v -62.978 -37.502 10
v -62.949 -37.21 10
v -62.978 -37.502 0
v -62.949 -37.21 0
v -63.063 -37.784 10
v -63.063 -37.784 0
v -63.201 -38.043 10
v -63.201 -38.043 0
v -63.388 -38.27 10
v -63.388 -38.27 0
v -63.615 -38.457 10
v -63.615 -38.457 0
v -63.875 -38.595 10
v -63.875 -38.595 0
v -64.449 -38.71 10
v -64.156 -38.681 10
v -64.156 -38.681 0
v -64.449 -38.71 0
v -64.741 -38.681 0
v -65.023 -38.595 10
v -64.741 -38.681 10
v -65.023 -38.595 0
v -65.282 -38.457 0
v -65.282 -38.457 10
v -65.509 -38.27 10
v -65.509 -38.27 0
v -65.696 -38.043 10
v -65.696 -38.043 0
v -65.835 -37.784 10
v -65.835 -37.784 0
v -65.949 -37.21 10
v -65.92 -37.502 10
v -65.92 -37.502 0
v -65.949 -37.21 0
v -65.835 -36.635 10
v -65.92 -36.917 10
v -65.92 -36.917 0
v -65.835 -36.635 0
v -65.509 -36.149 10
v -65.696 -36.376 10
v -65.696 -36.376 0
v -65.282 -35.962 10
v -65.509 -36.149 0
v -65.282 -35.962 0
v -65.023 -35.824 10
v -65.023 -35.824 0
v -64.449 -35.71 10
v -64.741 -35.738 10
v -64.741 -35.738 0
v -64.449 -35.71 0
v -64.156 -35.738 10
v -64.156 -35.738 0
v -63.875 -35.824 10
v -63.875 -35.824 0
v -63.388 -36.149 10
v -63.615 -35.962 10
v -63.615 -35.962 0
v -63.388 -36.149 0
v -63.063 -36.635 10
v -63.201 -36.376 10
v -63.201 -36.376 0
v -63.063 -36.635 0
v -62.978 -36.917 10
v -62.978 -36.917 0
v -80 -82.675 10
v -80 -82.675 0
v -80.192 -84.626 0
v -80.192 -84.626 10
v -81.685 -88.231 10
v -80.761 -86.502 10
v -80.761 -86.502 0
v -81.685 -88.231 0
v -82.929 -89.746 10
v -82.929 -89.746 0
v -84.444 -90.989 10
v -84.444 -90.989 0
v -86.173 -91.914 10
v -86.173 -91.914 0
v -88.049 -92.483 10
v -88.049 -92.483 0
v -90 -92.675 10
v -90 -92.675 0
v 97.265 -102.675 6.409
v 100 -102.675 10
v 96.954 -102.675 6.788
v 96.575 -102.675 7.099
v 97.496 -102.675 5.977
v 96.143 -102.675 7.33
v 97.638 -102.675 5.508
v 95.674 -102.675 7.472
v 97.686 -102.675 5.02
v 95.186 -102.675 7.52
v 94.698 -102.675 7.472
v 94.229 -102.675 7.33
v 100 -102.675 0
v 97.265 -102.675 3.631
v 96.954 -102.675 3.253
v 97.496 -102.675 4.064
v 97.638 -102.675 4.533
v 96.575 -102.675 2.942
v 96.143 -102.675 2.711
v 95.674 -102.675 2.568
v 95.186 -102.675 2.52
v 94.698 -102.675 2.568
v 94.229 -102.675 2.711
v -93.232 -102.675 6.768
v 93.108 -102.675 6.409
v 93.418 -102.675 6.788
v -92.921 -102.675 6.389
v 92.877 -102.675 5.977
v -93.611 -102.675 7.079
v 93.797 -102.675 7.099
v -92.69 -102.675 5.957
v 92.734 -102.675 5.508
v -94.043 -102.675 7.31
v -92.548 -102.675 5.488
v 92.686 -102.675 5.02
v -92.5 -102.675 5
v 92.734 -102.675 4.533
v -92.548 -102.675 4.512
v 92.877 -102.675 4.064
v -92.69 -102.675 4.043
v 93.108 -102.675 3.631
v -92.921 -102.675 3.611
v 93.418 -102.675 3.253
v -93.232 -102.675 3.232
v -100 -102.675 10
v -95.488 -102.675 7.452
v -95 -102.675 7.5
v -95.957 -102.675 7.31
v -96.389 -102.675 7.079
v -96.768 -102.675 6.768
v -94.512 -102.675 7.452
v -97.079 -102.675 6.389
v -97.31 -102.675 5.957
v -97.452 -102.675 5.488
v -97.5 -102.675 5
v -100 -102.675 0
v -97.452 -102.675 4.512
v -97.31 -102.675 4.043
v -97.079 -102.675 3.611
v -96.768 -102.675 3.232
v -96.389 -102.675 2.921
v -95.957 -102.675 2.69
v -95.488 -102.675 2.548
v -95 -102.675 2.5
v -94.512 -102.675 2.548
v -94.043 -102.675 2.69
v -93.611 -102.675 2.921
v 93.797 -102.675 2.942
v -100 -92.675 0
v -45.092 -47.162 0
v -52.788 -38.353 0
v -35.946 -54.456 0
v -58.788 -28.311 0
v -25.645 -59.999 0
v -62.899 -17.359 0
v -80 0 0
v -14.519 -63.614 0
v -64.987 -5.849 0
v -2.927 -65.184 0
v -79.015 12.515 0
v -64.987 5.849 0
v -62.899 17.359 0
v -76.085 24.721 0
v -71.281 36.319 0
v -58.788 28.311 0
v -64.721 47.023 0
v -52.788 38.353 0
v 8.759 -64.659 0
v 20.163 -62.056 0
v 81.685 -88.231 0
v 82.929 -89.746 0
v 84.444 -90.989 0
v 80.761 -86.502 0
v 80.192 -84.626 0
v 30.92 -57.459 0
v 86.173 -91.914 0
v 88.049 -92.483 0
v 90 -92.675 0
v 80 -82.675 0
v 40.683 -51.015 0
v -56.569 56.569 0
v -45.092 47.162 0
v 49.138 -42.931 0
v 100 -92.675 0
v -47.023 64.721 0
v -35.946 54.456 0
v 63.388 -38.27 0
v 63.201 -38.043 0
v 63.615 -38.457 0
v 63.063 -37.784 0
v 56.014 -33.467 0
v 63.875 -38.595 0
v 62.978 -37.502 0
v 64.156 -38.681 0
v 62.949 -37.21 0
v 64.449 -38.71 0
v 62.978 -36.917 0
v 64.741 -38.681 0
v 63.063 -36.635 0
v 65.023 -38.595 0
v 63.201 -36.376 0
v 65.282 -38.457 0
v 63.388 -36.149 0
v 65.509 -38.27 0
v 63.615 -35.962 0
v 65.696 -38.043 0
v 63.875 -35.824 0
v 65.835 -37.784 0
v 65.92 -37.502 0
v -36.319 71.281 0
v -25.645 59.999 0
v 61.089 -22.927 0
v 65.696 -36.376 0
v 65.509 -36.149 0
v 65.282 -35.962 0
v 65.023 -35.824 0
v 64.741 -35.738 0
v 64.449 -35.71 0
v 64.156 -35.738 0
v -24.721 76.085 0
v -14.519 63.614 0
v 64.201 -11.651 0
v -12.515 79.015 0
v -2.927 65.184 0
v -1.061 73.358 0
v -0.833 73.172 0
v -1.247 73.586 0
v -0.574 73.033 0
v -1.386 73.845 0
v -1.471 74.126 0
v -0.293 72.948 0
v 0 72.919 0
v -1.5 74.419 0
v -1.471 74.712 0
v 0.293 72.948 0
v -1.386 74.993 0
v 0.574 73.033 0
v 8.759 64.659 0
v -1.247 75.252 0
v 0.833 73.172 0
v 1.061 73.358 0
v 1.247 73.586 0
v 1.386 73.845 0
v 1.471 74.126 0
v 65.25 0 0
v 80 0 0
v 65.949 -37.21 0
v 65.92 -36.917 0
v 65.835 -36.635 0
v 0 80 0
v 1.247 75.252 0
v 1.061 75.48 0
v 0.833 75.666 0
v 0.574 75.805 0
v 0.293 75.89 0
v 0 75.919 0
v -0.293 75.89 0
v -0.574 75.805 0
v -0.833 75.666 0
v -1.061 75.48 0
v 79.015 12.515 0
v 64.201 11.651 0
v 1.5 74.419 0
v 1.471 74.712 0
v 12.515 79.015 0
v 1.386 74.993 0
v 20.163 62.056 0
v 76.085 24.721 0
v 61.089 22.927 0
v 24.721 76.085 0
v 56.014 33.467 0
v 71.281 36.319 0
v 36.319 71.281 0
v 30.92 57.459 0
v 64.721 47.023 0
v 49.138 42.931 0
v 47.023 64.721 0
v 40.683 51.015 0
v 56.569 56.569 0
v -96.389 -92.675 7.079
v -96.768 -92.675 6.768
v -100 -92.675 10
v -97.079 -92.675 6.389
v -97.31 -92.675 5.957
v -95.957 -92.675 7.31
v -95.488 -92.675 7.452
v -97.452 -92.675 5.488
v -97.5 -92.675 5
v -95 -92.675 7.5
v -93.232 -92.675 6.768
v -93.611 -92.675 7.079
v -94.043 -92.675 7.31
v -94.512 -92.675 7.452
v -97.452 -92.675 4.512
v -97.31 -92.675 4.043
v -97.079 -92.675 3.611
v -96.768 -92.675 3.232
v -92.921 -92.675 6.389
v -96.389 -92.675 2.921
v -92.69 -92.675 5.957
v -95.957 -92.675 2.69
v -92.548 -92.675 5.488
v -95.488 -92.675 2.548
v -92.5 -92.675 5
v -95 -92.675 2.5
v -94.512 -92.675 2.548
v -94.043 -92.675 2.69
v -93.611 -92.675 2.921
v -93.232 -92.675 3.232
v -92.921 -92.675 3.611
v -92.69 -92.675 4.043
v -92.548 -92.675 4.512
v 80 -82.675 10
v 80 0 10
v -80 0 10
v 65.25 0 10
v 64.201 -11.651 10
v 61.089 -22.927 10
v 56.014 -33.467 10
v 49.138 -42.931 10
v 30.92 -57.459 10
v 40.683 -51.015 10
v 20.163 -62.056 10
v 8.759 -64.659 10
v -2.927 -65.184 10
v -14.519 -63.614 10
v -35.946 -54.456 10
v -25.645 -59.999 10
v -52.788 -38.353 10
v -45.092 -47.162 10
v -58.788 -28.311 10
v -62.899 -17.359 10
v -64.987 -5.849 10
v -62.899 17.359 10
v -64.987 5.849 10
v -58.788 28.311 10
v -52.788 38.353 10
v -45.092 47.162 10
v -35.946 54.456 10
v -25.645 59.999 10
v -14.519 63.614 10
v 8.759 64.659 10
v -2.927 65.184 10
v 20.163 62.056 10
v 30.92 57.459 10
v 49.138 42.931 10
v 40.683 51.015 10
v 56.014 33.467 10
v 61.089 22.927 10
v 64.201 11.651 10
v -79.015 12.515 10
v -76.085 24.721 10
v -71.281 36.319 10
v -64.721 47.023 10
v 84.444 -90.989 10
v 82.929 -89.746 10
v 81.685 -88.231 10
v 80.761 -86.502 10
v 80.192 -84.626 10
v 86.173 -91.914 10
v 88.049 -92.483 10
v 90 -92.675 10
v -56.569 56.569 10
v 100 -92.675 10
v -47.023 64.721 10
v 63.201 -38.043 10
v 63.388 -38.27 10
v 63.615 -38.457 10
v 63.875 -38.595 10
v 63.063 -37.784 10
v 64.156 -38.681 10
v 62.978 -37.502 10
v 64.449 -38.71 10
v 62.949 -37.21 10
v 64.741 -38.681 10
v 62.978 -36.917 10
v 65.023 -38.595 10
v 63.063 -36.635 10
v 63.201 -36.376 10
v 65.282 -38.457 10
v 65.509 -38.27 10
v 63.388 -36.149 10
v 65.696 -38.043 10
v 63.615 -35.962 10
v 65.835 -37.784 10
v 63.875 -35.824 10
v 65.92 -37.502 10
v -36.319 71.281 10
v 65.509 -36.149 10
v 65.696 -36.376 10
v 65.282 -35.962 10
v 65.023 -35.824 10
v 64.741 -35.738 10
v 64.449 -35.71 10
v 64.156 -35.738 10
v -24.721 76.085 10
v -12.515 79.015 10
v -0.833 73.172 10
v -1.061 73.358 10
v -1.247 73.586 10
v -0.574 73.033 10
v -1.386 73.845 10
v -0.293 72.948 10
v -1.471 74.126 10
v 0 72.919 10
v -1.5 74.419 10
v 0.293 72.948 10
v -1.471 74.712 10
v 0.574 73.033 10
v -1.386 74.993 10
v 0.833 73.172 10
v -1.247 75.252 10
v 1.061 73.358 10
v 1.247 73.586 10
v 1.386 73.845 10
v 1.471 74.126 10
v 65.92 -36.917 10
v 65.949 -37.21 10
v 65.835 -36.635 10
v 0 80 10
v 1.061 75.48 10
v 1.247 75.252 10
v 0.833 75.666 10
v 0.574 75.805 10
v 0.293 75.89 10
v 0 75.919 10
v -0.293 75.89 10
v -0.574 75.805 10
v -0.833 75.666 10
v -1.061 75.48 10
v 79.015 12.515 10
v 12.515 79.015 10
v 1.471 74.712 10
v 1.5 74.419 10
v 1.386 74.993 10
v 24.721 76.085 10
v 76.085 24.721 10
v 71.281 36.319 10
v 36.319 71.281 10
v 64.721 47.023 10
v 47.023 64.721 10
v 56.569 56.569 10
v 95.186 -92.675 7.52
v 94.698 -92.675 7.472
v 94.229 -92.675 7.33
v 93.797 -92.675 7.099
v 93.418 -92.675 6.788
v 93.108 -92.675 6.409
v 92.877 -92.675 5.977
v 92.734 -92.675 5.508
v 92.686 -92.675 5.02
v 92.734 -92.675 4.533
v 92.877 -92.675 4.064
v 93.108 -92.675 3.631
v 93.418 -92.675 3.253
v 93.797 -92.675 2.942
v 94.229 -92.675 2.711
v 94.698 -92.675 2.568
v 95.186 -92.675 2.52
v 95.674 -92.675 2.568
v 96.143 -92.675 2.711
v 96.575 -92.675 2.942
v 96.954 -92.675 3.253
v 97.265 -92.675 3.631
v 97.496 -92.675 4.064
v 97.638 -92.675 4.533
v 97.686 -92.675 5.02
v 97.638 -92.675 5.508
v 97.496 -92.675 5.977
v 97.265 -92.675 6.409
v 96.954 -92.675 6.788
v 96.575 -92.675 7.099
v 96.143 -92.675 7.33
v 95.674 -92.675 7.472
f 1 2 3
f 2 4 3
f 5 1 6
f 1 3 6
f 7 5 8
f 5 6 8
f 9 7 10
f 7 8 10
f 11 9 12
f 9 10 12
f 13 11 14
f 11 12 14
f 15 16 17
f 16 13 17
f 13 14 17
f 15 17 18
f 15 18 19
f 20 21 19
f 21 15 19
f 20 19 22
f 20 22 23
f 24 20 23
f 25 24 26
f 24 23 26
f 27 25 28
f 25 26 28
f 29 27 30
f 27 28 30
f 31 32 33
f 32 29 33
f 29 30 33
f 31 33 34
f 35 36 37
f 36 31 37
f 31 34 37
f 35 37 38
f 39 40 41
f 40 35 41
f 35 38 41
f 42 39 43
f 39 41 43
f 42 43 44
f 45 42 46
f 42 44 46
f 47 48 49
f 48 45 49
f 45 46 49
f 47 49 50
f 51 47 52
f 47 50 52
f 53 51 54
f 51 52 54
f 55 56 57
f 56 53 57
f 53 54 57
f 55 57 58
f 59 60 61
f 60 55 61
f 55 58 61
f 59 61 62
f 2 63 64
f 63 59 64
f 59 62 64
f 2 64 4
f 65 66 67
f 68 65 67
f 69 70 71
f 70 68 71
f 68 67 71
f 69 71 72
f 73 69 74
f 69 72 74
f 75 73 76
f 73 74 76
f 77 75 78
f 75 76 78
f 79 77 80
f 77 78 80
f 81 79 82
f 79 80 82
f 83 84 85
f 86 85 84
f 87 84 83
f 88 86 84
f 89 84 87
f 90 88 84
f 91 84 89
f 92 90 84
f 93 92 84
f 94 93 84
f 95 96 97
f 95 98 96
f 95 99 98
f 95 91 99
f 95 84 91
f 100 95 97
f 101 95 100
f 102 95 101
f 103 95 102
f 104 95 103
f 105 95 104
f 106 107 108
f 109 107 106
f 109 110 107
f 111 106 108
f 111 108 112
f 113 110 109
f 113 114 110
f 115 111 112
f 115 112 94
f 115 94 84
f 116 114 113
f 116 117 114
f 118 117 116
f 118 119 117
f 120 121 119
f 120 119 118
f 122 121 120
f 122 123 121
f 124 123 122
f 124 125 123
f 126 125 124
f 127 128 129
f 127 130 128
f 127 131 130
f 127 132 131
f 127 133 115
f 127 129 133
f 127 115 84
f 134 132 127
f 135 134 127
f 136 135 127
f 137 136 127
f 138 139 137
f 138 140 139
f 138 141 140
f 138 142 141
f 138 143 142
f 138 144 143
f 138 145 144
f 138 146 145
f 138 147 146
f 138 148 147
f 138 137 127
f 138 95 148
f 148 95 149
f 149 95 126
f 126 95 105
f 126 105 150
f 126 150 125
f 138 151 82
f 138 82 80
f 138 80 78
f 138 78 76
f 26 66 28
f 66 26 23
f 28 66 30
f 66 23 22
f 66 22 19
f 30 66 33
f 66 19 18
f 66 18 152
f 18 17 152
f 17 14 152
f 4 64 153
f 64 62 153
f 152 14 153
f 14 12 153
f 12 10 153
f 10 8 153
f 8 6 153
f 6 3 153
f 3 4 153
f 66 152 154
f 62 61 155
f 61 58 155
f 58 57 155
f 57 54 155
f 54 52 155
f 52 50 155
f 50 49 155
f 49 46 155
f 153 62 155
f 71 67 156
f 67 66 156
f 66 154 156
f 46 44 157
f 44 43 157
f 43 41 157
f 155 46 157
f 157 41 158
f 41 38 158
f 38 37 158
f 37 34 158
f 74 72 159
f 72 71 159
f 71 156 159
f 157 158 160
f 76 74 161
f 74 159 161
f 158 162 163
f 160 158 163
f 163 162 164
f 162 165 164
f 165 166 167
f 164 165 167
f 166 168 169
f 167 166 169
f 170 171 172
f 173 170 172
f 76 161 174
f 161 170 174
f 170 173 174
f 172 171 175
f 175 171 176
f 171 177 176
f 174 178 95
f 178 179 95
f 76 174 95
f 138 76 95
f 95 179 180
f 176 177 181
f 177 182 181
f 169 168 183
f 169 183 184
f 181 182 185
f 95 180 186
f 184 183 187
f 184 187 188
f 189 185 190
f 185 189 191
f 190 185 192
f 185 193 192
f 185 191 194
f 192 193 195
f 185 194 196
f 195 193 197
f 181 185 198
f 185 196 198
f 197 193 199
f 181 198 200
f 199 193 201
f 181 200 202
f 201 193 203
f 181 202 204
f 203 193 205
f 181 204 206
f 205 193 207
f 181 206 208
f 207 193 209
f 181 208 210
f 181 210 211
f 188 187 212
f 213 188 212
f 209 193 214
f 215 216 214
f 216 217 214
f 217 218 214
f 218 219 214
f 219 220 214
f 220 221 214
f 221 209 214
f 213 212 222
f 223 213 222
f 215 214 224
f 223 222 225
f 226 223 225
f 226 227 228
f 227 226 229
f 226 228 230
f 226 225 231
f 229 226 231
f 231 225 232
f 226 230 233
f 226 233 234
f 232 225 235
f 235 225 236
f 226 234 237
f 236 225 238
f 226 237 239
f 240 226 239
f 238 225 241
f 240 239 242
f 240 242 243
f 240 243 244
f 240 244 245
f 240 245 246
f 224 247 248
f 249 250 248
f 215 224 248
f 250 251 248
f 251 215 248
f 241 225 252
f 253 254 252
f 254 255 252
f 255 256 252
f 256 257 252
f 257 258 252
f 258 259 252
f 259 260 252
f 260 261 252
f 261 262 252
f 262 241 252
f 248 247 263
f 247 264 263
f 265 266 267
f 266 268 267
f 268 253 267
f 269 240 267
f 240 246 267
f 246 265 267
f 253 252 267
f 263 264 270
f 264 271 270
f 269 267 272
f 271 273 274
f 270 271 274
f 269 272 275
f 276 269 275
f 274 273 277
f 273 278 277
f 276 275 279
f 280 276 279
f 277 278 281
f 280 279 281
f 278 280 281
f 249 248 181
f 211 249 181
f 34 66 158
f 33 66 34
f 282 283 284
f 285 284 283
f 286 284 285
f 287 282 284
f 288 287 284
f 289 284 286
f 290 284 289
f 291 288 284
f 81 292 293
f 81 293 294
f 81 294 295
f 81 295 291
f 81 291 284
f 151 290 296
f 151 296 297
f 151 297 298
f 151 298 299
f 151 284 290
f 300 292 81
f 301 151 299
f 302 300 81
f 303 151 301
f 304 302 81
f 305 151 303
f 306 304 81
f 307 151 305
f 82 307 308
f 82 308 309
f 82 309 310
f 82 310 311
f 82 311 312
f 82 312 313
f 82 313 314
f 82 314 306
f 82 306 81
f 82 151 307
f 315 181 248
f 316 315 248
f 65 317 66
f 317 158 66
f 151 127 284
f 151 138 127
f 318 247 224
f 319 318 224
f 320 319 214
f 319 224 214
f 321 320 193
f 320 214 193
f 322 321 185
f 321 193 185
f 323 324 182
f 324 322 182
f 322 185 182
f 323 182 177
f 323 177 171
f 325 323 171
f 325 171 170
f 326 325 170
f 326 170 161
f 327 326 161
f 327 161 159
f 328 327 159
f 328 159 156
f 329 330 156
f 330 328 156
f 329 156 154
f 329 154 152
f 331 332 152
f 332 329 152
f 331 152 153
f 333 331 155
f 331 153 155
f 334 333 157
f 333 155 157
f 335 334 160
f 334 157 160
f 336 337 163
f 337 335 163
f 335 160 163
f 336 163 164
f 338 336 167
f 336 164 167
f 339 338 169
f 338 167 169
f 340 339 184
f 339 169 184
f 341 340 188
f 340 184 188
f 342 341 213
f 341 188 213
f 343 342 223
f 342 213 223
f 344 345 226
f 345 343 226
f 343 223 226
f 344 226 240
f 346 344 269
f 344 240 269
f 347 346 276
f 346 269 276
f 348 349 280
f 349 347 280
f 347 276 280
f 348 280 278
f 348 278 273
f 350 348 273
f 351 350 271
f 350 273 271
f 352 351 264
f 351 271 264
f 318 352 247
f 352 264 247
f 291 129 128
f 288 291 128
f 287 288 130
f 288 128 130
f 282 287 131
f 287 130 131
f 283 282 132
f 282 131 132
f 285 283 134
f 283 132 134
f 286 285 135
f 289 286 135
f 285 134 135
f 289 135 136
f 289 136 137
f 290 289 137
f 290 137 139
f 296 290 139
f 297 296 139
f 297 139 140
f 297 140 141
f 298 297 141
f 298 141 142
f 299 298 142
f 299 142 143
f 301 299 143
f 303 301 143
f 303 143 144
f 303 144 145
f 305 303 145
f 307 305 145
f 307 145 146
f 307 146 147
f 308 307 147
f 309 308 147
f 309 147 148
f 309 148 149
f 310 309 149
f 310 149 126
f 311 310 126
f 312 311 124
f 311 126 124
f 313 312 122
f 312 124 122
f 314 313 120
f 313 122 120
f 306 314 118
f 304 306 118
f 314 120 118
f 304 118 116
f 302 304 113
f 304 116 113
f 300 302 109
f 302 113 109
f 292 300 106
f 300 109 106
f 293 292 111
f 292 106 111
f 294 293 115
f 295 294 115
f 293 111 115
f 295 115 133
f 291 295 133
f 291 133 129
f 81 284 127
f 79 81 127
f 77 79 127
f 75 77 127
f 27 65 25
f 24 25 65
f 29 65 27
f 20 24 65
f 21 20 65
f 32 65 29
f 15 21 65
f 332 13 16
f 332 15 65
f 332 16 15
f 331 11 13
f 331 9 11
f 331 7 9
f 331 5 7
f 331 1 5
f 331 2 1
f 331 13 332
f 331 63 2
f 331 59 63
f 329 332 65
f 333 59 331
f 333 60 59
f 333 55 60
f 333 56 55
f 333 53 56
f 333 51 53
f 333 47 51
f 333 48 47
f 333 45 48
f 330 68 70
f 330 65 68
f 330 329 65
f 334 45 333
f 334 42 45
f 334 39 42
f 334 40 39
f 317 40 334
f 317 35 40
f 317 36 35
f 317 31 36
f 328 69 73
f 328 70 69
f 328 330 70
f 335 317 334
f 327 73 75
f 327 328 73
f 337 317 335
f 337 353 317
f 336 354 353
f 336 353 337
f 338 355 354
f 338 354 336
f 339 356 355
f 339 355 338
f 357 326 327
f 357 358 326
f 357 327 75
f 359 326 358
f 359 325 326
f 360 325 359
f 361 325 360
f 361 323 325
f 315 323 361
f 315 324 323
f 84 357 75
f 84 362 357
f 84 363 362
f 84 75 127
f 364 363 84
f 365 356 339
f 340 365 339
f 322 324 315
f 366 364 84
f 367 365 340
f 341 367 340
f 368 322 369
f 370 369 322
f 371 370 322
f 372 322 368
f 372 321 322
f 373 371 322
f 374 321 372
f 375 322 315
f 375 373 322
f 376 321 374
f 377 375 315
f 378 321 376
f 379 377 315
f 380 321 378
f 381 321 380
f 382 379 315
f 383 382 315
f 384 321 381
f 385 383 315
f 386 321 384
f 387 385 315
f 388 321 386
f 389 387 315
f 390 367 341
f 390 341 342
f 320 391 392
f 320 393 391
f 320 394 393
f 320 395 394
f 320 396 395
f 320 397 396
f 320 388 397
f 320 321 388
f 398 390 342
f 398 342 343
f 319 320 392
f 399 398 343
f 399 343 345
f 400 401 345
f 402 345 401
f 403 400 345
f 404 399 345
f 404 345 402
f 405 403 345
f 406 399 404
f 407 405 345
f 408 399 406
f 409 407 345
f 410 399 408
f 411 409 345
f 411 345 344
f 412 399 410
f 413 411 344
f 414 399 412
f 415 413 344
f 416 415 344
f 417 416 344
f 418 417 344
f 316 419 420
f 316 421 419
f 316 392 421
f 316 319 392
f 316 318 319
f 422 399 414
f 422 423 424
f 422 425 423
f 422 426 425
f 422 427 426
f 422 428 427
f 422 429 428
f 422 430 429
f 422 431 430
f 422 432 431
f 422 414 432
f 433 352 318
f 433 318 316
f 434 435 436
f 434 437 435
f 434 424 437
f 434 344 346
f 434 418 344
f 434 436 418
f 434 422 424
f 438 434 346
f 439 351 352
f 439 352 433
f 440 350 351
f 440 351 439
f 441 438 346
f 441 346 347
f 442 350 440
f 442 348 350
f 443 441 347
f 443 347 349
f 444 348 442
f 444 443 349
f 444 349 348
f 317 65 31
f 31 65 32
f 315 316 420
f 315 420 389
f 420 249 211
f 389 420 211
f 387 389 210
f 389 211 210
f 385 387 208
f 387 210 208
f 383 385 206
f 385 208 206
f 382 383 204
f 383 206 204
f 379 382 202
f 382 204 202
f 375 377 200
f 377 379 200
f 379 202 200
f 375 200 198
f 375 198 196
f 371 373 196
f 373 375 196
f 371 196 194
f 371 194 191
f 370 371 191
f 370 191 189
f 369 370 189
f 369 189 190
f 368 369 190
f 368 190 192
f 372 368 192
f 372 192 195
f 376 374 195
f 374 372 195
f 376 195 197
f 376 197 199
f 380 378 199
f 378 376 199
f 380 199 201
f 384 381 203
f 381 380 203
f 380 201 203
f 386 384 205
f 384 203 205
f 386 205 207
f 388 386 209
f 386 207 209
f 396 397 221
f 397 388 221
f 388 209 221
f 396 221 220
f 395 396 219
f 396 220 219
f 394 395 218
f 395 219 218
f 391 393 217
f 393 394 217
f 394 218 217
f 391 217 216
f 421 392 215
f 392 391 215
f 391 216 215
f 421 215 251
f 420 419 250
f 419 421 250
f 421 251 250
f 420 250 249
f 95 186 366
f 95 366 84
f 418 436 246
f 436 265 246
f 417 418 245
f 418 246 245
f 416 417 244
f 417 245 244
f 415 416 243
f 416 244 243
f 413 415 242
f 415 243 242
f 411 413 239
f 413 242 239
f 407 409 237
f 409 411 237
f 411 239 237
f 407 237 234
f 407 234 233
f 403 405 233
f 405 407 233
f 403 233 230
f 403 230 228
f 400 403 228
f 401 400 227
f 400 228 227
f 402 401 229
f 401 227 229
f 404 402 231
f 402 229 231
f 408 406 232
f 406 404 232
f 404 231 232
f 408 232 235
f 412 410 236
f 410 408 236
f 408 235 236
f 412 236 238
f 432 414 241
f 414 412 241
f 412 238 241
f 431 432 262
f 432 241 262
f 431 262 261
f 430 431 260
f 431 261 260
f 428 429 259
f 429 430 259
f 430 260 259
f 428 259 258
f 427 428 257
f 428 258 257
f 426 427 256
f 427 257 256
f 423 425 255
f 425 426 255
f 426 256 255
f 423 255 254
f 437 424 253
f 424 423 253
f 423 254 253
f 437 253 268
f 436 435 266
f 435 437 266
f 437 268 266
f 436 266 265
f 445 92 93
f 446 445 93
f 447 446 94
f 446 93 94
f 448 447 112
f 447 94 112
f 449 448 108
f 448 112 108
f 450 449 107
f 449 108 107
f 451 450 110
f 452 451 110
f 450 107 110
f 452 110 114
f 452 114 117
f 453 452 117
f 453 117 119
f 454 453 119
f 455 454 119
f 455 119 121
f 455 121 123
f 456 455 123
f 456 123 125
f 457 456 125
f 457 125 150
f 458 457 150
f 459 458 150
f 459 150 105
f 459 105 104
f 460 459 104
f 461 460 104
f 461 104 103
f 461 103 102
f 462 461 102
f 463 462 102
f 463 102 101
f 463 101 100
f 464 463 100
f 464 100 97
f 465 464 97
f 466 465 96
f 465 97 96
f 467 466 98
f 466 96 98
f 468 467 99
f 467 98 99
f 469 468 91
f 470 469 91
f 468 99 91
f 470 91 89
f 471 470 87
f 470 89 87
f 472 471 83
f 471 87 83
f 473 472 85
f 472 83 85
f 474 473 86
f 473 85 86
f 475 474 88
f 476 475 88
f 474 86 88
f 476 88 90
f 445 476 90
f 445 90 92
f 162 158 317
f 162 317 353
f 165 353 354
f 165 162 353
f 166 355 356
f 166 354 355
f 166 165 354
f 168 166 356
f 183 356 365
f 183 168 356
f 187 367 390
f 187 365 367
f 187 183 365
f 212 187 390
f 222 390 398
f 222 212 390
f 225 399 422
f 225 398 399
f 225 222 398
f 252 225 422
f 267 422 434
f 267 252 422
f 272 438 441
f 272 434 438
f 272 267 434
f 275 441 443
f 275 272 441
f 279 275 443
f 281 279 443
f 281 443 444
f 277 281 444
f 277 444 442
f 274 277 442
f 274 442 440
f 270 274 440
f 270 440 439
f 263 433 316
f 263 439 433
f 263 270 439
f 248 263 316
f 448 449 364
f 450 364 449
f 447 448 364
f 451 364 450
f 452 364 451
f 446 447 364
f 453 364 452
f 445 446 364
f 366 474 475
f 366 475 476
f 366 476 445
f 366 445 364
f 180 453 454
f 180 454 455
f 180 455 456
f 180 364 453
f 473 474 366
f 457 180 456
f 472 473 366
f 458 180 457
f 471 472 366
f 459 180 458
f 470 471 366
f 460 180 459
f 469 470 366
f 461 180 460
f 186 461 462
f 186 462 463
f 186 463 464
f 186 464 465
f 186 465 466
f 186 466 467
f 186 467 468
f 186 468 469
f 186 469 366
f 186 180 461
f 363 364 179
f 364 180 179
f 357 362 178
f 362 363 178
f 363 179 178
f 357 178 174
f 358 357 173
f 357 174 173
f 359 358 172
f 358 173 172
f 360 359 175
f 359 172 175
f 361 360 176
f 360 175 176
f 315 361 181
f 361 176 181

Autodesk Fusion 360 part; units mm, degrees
sketch "Sketch1" plane through (0, 0, 0) normal (0, 0, 1) x (1, 0, 0)
  circle A0 centre (0, 0) radius 65.25
  circle A1 centre (0, 0) radius 74.419 construction
  circle A2 centre (0, 74.419) radius 1.5
  circle A3 centre (-64.4487, -37.2095) radius 1.5
  circle A4 centre (64.4487, -37.2095) radius 1.5
  circle A5 centre (0, 0) radius 80
  line L0 (-80, 0) -> (80, 0) construction
  line L1 (-80, 0) -> (-80, -82.6748)
  line L2 (80, -82.6748) -> (80, 0)
  line L3 (-80, -92.6748) -> (-100, -92.6748) construction
  line L4 (-100, -92.6748) -> (-90, -92.6748)
  line L5 (100, -92.6748) -> (100, -102.6748)
  line L6 (100, -102.6748) -> (-100, -102.6748)
  line L7 (-100, -102.6748) -> (-100, -92.6748)
  arc A6 (-90, -92.6748) -> (-80, -82.6748) centre (-90, -82.6748) ccw
  line L8 (90, -92.6748) -> (100, -92.6748)
  arc A7 (80, -82.6748) -> (90, -92.6748) centre (90, -82.6748) ccw
  dimension "d1" = 130.5
  dimension "d4" = 148.838
  dimension "d5" = 3
  dimension "d7" = 360
  dimension "d8" = 160
  dimension "d10" = 200
  dimension "d11" = 10
  dimension "d12" = 10
  dimension "d13" = 10
extrude "Extrude1" add sketch "Sketch1" along normal blind 10
hole "Hole1" at (-95, -92.6748, 5) direction (0, -1, 0) diameter 5 depth 10 tip angle 118
hole "Hole2" at (95.1862, -92.6748, 5.0204) direction (0, -1, 0) diameter 5 depth 10 tip angle 118
equation "d1 = GearboxDia + Tollerance"
equation "GearboxDia = 130 mm"
equation "Tollerance = 0.5 mm"
equation "d4 = ( 74.419 * 2 ) * 1 mm"
equation "d8 = GearboxDia + 30 mm"
equation "d10 = d8 + 40 mm"
